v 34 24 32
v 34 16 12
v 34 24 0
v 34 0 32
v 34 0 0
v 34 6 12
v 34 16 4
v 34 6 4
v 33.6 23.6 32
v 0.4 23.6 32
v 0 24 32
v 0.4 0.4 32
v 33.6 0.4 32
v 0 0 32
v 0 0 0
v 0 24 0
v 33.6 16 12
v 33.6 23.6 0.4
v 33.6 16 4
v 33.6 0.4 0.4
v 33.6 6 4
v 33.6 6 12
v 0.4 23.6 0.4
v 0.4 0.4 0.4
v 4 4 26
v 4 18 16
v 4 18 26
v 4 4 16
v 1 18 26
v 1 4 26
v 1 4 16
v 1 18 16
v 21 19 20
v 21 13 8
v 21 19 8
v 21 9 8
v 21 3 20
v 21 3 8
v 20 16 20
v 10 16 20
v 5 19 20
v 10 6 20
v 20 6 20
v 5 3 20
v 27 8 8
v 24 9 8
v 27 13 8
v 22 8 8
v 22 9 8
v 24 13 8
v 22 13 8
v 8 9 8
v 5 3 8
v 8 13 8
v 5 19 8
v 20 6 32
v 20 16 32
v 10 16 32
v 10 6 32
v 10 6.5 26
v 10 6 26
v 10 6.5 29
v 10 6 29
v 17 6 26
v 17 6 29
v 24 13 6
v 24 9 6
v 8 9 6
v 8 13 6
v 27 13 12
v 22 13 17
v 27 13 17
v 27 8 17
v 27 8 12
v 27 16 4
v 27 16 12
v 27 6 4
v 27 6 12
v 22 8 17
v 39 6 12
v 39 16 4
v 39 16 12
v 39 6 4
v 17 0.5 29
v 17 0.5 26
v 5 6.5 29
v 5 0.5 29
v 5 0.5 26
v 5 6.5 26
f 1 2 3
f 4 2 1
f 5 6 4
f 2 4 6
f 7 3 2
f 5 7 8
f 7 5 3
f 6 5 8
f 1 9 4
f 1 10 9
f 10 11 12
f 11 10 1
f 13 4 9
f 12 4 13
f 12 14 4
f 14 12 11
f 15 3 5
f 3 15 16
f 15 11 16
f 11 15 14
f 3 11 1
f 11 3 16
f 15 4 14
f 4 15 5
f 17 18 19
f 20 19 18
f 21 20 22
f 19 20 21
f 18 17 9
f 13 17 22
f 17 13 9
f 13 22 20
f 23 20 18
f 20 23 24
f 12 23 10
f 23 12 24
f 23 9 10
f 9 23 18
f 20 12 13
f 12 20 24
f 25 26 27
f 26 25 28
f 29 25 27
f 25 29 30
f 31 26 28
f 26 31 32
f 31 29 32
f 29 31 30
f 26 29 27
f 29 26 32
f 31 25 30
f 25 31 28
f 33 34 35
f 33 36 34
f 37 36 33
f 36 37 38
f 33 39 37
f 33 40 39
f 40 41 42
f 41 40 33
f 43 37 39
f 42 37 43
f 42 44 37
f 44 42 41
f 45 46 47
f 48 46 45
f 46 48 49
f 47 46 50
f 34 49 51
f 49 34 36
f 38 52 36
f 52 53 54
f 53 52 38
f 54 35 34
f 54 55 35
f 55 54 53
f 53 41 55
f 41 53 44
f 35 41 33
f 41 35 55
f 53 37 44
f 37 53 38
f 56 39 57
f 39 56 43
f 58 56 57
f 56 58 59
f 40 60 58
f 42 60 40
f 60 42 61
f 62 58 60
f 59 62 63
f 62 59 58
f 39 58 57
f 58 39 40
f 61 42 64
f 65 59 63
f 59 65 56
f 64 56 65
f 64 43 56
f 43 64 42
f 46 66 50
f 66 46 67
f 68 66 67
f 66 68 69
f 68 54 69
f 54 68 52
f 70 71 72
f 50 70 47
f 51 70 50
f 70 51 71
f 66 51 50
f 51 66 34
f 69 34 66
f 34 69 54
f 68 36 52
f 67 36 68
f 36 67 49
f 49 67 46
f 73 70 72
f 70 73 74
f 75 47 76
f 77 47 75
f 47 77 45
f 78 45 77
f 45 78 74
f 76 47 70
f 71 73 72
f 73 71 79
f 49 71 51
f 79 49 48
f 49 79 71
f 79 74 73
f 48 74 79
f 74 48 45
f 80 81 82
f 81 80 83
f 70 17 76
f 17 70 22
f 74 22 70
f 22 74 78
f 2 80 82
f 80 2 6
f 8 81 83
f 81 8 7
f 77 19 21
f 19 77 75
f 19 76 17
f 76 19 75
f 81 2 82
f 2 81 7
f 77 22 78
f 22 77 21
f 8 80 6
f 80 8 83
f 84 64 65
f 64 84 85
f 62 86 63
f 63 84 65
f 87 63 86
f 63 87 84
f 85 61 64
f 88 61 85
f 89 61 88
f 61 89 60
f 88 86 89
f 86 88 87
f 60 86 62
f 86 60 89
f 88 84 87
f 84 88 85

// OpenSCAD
// Tupan, Máquina de Chuva — carcaça paramétrica (OpenSCAD)
// Rode: openscad -o tupan.stl tupan.scad
wall = 0.4;  // espessura da parede (cm)
W = 34.0; D = 24.0; H = 32.0;

module carcaca() {
    difference() {
        cube([W, D, H]);
        translate([wall, wall, wall]) cube([W-2*wall, D-2*wall, H]);
    }
}

module pecas() {
    // ventoinhas
    translate([1.0, 4.0, 16.0]) cube([3.0, 14.0, 10.0]);
    // leito_CaCl2
    translate([5.0, 3.0, 8.0]) cube([16.0, 16.0, 12.0]);
    // vidraria
    translate([10.0, 6.0, 20.0]) cube([10.0, 10.0, 12.0]);
    // solenoide
    translate([8.0, 9.0, 6.0]) cube([16.0, 4.0, 2.0]);
    // filtro_mineral
    translate([22.0, 8.0, 8.0]) cube([5.0, 5.0, 9.0]);
    // bacia
    translate([27.0, 6.0, 4.0]) cube([12.0, 10.0, 8.0]);
    // arduino_e_sensores
    translate([5.0, 0.5, 26.0]) cube([12.0, 6.0, 3.0]);
}

carcaca();
pecas();
